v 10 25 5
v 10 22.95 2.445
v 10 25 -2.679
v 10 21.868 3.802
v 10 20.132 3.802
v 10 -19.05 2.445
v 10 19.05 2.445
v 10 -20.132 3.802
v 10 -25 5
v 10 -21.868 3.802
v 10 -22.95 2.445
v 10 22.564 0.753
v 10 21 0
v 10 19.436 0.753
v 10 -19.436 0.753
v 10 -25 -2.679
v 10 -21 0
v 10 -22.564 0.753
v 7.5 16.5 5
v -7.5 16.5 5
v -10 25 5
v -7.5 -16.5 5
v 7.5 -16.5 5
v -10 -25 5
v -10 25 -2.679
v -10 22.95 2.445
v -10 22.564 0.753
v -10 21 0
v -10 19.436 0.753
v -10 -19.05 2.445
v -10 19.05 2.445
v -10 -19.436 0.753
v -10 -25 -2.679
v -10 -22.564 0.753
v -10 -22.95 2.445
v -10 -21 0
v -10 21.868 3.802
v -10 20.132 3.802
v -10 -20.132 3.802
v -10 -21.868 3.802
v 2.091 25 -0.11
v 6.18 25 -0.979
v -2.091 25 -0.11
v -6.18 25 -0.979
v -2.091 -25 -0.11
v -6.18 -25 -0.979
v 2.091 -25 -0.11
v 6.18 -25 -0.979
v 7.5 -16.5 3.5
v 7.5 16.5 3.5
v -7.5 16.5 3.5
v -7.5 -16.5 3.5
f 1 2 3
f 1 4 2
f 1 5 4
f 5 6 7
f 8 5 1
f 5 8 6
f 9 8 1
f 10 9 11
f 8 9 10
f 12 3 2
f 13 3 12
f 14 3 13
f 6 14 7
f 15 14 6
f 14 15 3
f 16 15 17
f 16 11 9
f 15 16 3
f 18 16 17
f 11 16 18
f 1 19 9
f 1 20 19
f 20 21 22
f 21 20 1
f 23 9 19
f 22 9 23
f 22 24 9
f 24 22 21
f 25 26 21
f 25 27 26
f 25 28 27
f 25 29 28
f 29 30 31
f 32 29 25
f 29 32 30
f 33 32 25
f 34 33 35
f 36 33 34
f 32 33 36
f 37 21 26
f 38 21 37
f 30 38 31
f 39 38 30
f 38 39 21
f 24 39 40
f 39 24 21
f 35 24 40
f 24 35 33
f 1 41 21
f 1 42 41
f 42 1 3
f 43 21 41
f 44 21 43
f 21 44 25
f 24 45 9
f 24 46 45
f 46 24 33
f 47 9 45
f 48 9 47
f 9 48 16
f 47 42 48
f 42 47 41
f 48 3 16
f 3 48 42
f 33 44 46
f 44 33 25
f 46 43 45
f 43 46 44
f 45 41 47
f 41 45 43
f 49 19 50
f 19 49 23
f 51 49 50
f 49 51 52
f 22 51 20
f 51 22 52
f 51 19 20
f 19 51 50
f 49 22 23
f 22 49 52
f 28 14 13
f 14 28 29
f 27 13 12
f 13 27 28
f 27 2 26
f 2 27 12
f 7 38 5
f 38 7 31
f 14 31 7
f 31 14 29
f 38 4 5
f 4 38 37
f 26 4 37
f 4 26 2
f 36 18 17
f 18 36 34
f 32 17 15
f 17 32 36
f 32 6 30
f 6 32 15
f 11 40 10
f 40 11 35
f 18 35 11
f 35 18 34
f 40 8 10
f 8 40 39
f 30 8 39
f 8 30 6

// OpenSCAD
difference(){
    cube([20,50,10],center = true);
    
    translate([0,0,-20]){
        rotate([90,0,0]){
            cylinder(h=60, r=20, center=true);
        }
    }
    translate([0,0,5]){
        cube([15, 33, 3],center=true);
    }
    
    translate([0,21,2]){
        rotate([0,90,0]){
            cylinder(h=60, r=2, center=true);
        }
    }
        translate([0,-21,2]){
        rotate([0,90,0]){
            cylinder(h=60, r=2, center=true);
        }
    }
}
